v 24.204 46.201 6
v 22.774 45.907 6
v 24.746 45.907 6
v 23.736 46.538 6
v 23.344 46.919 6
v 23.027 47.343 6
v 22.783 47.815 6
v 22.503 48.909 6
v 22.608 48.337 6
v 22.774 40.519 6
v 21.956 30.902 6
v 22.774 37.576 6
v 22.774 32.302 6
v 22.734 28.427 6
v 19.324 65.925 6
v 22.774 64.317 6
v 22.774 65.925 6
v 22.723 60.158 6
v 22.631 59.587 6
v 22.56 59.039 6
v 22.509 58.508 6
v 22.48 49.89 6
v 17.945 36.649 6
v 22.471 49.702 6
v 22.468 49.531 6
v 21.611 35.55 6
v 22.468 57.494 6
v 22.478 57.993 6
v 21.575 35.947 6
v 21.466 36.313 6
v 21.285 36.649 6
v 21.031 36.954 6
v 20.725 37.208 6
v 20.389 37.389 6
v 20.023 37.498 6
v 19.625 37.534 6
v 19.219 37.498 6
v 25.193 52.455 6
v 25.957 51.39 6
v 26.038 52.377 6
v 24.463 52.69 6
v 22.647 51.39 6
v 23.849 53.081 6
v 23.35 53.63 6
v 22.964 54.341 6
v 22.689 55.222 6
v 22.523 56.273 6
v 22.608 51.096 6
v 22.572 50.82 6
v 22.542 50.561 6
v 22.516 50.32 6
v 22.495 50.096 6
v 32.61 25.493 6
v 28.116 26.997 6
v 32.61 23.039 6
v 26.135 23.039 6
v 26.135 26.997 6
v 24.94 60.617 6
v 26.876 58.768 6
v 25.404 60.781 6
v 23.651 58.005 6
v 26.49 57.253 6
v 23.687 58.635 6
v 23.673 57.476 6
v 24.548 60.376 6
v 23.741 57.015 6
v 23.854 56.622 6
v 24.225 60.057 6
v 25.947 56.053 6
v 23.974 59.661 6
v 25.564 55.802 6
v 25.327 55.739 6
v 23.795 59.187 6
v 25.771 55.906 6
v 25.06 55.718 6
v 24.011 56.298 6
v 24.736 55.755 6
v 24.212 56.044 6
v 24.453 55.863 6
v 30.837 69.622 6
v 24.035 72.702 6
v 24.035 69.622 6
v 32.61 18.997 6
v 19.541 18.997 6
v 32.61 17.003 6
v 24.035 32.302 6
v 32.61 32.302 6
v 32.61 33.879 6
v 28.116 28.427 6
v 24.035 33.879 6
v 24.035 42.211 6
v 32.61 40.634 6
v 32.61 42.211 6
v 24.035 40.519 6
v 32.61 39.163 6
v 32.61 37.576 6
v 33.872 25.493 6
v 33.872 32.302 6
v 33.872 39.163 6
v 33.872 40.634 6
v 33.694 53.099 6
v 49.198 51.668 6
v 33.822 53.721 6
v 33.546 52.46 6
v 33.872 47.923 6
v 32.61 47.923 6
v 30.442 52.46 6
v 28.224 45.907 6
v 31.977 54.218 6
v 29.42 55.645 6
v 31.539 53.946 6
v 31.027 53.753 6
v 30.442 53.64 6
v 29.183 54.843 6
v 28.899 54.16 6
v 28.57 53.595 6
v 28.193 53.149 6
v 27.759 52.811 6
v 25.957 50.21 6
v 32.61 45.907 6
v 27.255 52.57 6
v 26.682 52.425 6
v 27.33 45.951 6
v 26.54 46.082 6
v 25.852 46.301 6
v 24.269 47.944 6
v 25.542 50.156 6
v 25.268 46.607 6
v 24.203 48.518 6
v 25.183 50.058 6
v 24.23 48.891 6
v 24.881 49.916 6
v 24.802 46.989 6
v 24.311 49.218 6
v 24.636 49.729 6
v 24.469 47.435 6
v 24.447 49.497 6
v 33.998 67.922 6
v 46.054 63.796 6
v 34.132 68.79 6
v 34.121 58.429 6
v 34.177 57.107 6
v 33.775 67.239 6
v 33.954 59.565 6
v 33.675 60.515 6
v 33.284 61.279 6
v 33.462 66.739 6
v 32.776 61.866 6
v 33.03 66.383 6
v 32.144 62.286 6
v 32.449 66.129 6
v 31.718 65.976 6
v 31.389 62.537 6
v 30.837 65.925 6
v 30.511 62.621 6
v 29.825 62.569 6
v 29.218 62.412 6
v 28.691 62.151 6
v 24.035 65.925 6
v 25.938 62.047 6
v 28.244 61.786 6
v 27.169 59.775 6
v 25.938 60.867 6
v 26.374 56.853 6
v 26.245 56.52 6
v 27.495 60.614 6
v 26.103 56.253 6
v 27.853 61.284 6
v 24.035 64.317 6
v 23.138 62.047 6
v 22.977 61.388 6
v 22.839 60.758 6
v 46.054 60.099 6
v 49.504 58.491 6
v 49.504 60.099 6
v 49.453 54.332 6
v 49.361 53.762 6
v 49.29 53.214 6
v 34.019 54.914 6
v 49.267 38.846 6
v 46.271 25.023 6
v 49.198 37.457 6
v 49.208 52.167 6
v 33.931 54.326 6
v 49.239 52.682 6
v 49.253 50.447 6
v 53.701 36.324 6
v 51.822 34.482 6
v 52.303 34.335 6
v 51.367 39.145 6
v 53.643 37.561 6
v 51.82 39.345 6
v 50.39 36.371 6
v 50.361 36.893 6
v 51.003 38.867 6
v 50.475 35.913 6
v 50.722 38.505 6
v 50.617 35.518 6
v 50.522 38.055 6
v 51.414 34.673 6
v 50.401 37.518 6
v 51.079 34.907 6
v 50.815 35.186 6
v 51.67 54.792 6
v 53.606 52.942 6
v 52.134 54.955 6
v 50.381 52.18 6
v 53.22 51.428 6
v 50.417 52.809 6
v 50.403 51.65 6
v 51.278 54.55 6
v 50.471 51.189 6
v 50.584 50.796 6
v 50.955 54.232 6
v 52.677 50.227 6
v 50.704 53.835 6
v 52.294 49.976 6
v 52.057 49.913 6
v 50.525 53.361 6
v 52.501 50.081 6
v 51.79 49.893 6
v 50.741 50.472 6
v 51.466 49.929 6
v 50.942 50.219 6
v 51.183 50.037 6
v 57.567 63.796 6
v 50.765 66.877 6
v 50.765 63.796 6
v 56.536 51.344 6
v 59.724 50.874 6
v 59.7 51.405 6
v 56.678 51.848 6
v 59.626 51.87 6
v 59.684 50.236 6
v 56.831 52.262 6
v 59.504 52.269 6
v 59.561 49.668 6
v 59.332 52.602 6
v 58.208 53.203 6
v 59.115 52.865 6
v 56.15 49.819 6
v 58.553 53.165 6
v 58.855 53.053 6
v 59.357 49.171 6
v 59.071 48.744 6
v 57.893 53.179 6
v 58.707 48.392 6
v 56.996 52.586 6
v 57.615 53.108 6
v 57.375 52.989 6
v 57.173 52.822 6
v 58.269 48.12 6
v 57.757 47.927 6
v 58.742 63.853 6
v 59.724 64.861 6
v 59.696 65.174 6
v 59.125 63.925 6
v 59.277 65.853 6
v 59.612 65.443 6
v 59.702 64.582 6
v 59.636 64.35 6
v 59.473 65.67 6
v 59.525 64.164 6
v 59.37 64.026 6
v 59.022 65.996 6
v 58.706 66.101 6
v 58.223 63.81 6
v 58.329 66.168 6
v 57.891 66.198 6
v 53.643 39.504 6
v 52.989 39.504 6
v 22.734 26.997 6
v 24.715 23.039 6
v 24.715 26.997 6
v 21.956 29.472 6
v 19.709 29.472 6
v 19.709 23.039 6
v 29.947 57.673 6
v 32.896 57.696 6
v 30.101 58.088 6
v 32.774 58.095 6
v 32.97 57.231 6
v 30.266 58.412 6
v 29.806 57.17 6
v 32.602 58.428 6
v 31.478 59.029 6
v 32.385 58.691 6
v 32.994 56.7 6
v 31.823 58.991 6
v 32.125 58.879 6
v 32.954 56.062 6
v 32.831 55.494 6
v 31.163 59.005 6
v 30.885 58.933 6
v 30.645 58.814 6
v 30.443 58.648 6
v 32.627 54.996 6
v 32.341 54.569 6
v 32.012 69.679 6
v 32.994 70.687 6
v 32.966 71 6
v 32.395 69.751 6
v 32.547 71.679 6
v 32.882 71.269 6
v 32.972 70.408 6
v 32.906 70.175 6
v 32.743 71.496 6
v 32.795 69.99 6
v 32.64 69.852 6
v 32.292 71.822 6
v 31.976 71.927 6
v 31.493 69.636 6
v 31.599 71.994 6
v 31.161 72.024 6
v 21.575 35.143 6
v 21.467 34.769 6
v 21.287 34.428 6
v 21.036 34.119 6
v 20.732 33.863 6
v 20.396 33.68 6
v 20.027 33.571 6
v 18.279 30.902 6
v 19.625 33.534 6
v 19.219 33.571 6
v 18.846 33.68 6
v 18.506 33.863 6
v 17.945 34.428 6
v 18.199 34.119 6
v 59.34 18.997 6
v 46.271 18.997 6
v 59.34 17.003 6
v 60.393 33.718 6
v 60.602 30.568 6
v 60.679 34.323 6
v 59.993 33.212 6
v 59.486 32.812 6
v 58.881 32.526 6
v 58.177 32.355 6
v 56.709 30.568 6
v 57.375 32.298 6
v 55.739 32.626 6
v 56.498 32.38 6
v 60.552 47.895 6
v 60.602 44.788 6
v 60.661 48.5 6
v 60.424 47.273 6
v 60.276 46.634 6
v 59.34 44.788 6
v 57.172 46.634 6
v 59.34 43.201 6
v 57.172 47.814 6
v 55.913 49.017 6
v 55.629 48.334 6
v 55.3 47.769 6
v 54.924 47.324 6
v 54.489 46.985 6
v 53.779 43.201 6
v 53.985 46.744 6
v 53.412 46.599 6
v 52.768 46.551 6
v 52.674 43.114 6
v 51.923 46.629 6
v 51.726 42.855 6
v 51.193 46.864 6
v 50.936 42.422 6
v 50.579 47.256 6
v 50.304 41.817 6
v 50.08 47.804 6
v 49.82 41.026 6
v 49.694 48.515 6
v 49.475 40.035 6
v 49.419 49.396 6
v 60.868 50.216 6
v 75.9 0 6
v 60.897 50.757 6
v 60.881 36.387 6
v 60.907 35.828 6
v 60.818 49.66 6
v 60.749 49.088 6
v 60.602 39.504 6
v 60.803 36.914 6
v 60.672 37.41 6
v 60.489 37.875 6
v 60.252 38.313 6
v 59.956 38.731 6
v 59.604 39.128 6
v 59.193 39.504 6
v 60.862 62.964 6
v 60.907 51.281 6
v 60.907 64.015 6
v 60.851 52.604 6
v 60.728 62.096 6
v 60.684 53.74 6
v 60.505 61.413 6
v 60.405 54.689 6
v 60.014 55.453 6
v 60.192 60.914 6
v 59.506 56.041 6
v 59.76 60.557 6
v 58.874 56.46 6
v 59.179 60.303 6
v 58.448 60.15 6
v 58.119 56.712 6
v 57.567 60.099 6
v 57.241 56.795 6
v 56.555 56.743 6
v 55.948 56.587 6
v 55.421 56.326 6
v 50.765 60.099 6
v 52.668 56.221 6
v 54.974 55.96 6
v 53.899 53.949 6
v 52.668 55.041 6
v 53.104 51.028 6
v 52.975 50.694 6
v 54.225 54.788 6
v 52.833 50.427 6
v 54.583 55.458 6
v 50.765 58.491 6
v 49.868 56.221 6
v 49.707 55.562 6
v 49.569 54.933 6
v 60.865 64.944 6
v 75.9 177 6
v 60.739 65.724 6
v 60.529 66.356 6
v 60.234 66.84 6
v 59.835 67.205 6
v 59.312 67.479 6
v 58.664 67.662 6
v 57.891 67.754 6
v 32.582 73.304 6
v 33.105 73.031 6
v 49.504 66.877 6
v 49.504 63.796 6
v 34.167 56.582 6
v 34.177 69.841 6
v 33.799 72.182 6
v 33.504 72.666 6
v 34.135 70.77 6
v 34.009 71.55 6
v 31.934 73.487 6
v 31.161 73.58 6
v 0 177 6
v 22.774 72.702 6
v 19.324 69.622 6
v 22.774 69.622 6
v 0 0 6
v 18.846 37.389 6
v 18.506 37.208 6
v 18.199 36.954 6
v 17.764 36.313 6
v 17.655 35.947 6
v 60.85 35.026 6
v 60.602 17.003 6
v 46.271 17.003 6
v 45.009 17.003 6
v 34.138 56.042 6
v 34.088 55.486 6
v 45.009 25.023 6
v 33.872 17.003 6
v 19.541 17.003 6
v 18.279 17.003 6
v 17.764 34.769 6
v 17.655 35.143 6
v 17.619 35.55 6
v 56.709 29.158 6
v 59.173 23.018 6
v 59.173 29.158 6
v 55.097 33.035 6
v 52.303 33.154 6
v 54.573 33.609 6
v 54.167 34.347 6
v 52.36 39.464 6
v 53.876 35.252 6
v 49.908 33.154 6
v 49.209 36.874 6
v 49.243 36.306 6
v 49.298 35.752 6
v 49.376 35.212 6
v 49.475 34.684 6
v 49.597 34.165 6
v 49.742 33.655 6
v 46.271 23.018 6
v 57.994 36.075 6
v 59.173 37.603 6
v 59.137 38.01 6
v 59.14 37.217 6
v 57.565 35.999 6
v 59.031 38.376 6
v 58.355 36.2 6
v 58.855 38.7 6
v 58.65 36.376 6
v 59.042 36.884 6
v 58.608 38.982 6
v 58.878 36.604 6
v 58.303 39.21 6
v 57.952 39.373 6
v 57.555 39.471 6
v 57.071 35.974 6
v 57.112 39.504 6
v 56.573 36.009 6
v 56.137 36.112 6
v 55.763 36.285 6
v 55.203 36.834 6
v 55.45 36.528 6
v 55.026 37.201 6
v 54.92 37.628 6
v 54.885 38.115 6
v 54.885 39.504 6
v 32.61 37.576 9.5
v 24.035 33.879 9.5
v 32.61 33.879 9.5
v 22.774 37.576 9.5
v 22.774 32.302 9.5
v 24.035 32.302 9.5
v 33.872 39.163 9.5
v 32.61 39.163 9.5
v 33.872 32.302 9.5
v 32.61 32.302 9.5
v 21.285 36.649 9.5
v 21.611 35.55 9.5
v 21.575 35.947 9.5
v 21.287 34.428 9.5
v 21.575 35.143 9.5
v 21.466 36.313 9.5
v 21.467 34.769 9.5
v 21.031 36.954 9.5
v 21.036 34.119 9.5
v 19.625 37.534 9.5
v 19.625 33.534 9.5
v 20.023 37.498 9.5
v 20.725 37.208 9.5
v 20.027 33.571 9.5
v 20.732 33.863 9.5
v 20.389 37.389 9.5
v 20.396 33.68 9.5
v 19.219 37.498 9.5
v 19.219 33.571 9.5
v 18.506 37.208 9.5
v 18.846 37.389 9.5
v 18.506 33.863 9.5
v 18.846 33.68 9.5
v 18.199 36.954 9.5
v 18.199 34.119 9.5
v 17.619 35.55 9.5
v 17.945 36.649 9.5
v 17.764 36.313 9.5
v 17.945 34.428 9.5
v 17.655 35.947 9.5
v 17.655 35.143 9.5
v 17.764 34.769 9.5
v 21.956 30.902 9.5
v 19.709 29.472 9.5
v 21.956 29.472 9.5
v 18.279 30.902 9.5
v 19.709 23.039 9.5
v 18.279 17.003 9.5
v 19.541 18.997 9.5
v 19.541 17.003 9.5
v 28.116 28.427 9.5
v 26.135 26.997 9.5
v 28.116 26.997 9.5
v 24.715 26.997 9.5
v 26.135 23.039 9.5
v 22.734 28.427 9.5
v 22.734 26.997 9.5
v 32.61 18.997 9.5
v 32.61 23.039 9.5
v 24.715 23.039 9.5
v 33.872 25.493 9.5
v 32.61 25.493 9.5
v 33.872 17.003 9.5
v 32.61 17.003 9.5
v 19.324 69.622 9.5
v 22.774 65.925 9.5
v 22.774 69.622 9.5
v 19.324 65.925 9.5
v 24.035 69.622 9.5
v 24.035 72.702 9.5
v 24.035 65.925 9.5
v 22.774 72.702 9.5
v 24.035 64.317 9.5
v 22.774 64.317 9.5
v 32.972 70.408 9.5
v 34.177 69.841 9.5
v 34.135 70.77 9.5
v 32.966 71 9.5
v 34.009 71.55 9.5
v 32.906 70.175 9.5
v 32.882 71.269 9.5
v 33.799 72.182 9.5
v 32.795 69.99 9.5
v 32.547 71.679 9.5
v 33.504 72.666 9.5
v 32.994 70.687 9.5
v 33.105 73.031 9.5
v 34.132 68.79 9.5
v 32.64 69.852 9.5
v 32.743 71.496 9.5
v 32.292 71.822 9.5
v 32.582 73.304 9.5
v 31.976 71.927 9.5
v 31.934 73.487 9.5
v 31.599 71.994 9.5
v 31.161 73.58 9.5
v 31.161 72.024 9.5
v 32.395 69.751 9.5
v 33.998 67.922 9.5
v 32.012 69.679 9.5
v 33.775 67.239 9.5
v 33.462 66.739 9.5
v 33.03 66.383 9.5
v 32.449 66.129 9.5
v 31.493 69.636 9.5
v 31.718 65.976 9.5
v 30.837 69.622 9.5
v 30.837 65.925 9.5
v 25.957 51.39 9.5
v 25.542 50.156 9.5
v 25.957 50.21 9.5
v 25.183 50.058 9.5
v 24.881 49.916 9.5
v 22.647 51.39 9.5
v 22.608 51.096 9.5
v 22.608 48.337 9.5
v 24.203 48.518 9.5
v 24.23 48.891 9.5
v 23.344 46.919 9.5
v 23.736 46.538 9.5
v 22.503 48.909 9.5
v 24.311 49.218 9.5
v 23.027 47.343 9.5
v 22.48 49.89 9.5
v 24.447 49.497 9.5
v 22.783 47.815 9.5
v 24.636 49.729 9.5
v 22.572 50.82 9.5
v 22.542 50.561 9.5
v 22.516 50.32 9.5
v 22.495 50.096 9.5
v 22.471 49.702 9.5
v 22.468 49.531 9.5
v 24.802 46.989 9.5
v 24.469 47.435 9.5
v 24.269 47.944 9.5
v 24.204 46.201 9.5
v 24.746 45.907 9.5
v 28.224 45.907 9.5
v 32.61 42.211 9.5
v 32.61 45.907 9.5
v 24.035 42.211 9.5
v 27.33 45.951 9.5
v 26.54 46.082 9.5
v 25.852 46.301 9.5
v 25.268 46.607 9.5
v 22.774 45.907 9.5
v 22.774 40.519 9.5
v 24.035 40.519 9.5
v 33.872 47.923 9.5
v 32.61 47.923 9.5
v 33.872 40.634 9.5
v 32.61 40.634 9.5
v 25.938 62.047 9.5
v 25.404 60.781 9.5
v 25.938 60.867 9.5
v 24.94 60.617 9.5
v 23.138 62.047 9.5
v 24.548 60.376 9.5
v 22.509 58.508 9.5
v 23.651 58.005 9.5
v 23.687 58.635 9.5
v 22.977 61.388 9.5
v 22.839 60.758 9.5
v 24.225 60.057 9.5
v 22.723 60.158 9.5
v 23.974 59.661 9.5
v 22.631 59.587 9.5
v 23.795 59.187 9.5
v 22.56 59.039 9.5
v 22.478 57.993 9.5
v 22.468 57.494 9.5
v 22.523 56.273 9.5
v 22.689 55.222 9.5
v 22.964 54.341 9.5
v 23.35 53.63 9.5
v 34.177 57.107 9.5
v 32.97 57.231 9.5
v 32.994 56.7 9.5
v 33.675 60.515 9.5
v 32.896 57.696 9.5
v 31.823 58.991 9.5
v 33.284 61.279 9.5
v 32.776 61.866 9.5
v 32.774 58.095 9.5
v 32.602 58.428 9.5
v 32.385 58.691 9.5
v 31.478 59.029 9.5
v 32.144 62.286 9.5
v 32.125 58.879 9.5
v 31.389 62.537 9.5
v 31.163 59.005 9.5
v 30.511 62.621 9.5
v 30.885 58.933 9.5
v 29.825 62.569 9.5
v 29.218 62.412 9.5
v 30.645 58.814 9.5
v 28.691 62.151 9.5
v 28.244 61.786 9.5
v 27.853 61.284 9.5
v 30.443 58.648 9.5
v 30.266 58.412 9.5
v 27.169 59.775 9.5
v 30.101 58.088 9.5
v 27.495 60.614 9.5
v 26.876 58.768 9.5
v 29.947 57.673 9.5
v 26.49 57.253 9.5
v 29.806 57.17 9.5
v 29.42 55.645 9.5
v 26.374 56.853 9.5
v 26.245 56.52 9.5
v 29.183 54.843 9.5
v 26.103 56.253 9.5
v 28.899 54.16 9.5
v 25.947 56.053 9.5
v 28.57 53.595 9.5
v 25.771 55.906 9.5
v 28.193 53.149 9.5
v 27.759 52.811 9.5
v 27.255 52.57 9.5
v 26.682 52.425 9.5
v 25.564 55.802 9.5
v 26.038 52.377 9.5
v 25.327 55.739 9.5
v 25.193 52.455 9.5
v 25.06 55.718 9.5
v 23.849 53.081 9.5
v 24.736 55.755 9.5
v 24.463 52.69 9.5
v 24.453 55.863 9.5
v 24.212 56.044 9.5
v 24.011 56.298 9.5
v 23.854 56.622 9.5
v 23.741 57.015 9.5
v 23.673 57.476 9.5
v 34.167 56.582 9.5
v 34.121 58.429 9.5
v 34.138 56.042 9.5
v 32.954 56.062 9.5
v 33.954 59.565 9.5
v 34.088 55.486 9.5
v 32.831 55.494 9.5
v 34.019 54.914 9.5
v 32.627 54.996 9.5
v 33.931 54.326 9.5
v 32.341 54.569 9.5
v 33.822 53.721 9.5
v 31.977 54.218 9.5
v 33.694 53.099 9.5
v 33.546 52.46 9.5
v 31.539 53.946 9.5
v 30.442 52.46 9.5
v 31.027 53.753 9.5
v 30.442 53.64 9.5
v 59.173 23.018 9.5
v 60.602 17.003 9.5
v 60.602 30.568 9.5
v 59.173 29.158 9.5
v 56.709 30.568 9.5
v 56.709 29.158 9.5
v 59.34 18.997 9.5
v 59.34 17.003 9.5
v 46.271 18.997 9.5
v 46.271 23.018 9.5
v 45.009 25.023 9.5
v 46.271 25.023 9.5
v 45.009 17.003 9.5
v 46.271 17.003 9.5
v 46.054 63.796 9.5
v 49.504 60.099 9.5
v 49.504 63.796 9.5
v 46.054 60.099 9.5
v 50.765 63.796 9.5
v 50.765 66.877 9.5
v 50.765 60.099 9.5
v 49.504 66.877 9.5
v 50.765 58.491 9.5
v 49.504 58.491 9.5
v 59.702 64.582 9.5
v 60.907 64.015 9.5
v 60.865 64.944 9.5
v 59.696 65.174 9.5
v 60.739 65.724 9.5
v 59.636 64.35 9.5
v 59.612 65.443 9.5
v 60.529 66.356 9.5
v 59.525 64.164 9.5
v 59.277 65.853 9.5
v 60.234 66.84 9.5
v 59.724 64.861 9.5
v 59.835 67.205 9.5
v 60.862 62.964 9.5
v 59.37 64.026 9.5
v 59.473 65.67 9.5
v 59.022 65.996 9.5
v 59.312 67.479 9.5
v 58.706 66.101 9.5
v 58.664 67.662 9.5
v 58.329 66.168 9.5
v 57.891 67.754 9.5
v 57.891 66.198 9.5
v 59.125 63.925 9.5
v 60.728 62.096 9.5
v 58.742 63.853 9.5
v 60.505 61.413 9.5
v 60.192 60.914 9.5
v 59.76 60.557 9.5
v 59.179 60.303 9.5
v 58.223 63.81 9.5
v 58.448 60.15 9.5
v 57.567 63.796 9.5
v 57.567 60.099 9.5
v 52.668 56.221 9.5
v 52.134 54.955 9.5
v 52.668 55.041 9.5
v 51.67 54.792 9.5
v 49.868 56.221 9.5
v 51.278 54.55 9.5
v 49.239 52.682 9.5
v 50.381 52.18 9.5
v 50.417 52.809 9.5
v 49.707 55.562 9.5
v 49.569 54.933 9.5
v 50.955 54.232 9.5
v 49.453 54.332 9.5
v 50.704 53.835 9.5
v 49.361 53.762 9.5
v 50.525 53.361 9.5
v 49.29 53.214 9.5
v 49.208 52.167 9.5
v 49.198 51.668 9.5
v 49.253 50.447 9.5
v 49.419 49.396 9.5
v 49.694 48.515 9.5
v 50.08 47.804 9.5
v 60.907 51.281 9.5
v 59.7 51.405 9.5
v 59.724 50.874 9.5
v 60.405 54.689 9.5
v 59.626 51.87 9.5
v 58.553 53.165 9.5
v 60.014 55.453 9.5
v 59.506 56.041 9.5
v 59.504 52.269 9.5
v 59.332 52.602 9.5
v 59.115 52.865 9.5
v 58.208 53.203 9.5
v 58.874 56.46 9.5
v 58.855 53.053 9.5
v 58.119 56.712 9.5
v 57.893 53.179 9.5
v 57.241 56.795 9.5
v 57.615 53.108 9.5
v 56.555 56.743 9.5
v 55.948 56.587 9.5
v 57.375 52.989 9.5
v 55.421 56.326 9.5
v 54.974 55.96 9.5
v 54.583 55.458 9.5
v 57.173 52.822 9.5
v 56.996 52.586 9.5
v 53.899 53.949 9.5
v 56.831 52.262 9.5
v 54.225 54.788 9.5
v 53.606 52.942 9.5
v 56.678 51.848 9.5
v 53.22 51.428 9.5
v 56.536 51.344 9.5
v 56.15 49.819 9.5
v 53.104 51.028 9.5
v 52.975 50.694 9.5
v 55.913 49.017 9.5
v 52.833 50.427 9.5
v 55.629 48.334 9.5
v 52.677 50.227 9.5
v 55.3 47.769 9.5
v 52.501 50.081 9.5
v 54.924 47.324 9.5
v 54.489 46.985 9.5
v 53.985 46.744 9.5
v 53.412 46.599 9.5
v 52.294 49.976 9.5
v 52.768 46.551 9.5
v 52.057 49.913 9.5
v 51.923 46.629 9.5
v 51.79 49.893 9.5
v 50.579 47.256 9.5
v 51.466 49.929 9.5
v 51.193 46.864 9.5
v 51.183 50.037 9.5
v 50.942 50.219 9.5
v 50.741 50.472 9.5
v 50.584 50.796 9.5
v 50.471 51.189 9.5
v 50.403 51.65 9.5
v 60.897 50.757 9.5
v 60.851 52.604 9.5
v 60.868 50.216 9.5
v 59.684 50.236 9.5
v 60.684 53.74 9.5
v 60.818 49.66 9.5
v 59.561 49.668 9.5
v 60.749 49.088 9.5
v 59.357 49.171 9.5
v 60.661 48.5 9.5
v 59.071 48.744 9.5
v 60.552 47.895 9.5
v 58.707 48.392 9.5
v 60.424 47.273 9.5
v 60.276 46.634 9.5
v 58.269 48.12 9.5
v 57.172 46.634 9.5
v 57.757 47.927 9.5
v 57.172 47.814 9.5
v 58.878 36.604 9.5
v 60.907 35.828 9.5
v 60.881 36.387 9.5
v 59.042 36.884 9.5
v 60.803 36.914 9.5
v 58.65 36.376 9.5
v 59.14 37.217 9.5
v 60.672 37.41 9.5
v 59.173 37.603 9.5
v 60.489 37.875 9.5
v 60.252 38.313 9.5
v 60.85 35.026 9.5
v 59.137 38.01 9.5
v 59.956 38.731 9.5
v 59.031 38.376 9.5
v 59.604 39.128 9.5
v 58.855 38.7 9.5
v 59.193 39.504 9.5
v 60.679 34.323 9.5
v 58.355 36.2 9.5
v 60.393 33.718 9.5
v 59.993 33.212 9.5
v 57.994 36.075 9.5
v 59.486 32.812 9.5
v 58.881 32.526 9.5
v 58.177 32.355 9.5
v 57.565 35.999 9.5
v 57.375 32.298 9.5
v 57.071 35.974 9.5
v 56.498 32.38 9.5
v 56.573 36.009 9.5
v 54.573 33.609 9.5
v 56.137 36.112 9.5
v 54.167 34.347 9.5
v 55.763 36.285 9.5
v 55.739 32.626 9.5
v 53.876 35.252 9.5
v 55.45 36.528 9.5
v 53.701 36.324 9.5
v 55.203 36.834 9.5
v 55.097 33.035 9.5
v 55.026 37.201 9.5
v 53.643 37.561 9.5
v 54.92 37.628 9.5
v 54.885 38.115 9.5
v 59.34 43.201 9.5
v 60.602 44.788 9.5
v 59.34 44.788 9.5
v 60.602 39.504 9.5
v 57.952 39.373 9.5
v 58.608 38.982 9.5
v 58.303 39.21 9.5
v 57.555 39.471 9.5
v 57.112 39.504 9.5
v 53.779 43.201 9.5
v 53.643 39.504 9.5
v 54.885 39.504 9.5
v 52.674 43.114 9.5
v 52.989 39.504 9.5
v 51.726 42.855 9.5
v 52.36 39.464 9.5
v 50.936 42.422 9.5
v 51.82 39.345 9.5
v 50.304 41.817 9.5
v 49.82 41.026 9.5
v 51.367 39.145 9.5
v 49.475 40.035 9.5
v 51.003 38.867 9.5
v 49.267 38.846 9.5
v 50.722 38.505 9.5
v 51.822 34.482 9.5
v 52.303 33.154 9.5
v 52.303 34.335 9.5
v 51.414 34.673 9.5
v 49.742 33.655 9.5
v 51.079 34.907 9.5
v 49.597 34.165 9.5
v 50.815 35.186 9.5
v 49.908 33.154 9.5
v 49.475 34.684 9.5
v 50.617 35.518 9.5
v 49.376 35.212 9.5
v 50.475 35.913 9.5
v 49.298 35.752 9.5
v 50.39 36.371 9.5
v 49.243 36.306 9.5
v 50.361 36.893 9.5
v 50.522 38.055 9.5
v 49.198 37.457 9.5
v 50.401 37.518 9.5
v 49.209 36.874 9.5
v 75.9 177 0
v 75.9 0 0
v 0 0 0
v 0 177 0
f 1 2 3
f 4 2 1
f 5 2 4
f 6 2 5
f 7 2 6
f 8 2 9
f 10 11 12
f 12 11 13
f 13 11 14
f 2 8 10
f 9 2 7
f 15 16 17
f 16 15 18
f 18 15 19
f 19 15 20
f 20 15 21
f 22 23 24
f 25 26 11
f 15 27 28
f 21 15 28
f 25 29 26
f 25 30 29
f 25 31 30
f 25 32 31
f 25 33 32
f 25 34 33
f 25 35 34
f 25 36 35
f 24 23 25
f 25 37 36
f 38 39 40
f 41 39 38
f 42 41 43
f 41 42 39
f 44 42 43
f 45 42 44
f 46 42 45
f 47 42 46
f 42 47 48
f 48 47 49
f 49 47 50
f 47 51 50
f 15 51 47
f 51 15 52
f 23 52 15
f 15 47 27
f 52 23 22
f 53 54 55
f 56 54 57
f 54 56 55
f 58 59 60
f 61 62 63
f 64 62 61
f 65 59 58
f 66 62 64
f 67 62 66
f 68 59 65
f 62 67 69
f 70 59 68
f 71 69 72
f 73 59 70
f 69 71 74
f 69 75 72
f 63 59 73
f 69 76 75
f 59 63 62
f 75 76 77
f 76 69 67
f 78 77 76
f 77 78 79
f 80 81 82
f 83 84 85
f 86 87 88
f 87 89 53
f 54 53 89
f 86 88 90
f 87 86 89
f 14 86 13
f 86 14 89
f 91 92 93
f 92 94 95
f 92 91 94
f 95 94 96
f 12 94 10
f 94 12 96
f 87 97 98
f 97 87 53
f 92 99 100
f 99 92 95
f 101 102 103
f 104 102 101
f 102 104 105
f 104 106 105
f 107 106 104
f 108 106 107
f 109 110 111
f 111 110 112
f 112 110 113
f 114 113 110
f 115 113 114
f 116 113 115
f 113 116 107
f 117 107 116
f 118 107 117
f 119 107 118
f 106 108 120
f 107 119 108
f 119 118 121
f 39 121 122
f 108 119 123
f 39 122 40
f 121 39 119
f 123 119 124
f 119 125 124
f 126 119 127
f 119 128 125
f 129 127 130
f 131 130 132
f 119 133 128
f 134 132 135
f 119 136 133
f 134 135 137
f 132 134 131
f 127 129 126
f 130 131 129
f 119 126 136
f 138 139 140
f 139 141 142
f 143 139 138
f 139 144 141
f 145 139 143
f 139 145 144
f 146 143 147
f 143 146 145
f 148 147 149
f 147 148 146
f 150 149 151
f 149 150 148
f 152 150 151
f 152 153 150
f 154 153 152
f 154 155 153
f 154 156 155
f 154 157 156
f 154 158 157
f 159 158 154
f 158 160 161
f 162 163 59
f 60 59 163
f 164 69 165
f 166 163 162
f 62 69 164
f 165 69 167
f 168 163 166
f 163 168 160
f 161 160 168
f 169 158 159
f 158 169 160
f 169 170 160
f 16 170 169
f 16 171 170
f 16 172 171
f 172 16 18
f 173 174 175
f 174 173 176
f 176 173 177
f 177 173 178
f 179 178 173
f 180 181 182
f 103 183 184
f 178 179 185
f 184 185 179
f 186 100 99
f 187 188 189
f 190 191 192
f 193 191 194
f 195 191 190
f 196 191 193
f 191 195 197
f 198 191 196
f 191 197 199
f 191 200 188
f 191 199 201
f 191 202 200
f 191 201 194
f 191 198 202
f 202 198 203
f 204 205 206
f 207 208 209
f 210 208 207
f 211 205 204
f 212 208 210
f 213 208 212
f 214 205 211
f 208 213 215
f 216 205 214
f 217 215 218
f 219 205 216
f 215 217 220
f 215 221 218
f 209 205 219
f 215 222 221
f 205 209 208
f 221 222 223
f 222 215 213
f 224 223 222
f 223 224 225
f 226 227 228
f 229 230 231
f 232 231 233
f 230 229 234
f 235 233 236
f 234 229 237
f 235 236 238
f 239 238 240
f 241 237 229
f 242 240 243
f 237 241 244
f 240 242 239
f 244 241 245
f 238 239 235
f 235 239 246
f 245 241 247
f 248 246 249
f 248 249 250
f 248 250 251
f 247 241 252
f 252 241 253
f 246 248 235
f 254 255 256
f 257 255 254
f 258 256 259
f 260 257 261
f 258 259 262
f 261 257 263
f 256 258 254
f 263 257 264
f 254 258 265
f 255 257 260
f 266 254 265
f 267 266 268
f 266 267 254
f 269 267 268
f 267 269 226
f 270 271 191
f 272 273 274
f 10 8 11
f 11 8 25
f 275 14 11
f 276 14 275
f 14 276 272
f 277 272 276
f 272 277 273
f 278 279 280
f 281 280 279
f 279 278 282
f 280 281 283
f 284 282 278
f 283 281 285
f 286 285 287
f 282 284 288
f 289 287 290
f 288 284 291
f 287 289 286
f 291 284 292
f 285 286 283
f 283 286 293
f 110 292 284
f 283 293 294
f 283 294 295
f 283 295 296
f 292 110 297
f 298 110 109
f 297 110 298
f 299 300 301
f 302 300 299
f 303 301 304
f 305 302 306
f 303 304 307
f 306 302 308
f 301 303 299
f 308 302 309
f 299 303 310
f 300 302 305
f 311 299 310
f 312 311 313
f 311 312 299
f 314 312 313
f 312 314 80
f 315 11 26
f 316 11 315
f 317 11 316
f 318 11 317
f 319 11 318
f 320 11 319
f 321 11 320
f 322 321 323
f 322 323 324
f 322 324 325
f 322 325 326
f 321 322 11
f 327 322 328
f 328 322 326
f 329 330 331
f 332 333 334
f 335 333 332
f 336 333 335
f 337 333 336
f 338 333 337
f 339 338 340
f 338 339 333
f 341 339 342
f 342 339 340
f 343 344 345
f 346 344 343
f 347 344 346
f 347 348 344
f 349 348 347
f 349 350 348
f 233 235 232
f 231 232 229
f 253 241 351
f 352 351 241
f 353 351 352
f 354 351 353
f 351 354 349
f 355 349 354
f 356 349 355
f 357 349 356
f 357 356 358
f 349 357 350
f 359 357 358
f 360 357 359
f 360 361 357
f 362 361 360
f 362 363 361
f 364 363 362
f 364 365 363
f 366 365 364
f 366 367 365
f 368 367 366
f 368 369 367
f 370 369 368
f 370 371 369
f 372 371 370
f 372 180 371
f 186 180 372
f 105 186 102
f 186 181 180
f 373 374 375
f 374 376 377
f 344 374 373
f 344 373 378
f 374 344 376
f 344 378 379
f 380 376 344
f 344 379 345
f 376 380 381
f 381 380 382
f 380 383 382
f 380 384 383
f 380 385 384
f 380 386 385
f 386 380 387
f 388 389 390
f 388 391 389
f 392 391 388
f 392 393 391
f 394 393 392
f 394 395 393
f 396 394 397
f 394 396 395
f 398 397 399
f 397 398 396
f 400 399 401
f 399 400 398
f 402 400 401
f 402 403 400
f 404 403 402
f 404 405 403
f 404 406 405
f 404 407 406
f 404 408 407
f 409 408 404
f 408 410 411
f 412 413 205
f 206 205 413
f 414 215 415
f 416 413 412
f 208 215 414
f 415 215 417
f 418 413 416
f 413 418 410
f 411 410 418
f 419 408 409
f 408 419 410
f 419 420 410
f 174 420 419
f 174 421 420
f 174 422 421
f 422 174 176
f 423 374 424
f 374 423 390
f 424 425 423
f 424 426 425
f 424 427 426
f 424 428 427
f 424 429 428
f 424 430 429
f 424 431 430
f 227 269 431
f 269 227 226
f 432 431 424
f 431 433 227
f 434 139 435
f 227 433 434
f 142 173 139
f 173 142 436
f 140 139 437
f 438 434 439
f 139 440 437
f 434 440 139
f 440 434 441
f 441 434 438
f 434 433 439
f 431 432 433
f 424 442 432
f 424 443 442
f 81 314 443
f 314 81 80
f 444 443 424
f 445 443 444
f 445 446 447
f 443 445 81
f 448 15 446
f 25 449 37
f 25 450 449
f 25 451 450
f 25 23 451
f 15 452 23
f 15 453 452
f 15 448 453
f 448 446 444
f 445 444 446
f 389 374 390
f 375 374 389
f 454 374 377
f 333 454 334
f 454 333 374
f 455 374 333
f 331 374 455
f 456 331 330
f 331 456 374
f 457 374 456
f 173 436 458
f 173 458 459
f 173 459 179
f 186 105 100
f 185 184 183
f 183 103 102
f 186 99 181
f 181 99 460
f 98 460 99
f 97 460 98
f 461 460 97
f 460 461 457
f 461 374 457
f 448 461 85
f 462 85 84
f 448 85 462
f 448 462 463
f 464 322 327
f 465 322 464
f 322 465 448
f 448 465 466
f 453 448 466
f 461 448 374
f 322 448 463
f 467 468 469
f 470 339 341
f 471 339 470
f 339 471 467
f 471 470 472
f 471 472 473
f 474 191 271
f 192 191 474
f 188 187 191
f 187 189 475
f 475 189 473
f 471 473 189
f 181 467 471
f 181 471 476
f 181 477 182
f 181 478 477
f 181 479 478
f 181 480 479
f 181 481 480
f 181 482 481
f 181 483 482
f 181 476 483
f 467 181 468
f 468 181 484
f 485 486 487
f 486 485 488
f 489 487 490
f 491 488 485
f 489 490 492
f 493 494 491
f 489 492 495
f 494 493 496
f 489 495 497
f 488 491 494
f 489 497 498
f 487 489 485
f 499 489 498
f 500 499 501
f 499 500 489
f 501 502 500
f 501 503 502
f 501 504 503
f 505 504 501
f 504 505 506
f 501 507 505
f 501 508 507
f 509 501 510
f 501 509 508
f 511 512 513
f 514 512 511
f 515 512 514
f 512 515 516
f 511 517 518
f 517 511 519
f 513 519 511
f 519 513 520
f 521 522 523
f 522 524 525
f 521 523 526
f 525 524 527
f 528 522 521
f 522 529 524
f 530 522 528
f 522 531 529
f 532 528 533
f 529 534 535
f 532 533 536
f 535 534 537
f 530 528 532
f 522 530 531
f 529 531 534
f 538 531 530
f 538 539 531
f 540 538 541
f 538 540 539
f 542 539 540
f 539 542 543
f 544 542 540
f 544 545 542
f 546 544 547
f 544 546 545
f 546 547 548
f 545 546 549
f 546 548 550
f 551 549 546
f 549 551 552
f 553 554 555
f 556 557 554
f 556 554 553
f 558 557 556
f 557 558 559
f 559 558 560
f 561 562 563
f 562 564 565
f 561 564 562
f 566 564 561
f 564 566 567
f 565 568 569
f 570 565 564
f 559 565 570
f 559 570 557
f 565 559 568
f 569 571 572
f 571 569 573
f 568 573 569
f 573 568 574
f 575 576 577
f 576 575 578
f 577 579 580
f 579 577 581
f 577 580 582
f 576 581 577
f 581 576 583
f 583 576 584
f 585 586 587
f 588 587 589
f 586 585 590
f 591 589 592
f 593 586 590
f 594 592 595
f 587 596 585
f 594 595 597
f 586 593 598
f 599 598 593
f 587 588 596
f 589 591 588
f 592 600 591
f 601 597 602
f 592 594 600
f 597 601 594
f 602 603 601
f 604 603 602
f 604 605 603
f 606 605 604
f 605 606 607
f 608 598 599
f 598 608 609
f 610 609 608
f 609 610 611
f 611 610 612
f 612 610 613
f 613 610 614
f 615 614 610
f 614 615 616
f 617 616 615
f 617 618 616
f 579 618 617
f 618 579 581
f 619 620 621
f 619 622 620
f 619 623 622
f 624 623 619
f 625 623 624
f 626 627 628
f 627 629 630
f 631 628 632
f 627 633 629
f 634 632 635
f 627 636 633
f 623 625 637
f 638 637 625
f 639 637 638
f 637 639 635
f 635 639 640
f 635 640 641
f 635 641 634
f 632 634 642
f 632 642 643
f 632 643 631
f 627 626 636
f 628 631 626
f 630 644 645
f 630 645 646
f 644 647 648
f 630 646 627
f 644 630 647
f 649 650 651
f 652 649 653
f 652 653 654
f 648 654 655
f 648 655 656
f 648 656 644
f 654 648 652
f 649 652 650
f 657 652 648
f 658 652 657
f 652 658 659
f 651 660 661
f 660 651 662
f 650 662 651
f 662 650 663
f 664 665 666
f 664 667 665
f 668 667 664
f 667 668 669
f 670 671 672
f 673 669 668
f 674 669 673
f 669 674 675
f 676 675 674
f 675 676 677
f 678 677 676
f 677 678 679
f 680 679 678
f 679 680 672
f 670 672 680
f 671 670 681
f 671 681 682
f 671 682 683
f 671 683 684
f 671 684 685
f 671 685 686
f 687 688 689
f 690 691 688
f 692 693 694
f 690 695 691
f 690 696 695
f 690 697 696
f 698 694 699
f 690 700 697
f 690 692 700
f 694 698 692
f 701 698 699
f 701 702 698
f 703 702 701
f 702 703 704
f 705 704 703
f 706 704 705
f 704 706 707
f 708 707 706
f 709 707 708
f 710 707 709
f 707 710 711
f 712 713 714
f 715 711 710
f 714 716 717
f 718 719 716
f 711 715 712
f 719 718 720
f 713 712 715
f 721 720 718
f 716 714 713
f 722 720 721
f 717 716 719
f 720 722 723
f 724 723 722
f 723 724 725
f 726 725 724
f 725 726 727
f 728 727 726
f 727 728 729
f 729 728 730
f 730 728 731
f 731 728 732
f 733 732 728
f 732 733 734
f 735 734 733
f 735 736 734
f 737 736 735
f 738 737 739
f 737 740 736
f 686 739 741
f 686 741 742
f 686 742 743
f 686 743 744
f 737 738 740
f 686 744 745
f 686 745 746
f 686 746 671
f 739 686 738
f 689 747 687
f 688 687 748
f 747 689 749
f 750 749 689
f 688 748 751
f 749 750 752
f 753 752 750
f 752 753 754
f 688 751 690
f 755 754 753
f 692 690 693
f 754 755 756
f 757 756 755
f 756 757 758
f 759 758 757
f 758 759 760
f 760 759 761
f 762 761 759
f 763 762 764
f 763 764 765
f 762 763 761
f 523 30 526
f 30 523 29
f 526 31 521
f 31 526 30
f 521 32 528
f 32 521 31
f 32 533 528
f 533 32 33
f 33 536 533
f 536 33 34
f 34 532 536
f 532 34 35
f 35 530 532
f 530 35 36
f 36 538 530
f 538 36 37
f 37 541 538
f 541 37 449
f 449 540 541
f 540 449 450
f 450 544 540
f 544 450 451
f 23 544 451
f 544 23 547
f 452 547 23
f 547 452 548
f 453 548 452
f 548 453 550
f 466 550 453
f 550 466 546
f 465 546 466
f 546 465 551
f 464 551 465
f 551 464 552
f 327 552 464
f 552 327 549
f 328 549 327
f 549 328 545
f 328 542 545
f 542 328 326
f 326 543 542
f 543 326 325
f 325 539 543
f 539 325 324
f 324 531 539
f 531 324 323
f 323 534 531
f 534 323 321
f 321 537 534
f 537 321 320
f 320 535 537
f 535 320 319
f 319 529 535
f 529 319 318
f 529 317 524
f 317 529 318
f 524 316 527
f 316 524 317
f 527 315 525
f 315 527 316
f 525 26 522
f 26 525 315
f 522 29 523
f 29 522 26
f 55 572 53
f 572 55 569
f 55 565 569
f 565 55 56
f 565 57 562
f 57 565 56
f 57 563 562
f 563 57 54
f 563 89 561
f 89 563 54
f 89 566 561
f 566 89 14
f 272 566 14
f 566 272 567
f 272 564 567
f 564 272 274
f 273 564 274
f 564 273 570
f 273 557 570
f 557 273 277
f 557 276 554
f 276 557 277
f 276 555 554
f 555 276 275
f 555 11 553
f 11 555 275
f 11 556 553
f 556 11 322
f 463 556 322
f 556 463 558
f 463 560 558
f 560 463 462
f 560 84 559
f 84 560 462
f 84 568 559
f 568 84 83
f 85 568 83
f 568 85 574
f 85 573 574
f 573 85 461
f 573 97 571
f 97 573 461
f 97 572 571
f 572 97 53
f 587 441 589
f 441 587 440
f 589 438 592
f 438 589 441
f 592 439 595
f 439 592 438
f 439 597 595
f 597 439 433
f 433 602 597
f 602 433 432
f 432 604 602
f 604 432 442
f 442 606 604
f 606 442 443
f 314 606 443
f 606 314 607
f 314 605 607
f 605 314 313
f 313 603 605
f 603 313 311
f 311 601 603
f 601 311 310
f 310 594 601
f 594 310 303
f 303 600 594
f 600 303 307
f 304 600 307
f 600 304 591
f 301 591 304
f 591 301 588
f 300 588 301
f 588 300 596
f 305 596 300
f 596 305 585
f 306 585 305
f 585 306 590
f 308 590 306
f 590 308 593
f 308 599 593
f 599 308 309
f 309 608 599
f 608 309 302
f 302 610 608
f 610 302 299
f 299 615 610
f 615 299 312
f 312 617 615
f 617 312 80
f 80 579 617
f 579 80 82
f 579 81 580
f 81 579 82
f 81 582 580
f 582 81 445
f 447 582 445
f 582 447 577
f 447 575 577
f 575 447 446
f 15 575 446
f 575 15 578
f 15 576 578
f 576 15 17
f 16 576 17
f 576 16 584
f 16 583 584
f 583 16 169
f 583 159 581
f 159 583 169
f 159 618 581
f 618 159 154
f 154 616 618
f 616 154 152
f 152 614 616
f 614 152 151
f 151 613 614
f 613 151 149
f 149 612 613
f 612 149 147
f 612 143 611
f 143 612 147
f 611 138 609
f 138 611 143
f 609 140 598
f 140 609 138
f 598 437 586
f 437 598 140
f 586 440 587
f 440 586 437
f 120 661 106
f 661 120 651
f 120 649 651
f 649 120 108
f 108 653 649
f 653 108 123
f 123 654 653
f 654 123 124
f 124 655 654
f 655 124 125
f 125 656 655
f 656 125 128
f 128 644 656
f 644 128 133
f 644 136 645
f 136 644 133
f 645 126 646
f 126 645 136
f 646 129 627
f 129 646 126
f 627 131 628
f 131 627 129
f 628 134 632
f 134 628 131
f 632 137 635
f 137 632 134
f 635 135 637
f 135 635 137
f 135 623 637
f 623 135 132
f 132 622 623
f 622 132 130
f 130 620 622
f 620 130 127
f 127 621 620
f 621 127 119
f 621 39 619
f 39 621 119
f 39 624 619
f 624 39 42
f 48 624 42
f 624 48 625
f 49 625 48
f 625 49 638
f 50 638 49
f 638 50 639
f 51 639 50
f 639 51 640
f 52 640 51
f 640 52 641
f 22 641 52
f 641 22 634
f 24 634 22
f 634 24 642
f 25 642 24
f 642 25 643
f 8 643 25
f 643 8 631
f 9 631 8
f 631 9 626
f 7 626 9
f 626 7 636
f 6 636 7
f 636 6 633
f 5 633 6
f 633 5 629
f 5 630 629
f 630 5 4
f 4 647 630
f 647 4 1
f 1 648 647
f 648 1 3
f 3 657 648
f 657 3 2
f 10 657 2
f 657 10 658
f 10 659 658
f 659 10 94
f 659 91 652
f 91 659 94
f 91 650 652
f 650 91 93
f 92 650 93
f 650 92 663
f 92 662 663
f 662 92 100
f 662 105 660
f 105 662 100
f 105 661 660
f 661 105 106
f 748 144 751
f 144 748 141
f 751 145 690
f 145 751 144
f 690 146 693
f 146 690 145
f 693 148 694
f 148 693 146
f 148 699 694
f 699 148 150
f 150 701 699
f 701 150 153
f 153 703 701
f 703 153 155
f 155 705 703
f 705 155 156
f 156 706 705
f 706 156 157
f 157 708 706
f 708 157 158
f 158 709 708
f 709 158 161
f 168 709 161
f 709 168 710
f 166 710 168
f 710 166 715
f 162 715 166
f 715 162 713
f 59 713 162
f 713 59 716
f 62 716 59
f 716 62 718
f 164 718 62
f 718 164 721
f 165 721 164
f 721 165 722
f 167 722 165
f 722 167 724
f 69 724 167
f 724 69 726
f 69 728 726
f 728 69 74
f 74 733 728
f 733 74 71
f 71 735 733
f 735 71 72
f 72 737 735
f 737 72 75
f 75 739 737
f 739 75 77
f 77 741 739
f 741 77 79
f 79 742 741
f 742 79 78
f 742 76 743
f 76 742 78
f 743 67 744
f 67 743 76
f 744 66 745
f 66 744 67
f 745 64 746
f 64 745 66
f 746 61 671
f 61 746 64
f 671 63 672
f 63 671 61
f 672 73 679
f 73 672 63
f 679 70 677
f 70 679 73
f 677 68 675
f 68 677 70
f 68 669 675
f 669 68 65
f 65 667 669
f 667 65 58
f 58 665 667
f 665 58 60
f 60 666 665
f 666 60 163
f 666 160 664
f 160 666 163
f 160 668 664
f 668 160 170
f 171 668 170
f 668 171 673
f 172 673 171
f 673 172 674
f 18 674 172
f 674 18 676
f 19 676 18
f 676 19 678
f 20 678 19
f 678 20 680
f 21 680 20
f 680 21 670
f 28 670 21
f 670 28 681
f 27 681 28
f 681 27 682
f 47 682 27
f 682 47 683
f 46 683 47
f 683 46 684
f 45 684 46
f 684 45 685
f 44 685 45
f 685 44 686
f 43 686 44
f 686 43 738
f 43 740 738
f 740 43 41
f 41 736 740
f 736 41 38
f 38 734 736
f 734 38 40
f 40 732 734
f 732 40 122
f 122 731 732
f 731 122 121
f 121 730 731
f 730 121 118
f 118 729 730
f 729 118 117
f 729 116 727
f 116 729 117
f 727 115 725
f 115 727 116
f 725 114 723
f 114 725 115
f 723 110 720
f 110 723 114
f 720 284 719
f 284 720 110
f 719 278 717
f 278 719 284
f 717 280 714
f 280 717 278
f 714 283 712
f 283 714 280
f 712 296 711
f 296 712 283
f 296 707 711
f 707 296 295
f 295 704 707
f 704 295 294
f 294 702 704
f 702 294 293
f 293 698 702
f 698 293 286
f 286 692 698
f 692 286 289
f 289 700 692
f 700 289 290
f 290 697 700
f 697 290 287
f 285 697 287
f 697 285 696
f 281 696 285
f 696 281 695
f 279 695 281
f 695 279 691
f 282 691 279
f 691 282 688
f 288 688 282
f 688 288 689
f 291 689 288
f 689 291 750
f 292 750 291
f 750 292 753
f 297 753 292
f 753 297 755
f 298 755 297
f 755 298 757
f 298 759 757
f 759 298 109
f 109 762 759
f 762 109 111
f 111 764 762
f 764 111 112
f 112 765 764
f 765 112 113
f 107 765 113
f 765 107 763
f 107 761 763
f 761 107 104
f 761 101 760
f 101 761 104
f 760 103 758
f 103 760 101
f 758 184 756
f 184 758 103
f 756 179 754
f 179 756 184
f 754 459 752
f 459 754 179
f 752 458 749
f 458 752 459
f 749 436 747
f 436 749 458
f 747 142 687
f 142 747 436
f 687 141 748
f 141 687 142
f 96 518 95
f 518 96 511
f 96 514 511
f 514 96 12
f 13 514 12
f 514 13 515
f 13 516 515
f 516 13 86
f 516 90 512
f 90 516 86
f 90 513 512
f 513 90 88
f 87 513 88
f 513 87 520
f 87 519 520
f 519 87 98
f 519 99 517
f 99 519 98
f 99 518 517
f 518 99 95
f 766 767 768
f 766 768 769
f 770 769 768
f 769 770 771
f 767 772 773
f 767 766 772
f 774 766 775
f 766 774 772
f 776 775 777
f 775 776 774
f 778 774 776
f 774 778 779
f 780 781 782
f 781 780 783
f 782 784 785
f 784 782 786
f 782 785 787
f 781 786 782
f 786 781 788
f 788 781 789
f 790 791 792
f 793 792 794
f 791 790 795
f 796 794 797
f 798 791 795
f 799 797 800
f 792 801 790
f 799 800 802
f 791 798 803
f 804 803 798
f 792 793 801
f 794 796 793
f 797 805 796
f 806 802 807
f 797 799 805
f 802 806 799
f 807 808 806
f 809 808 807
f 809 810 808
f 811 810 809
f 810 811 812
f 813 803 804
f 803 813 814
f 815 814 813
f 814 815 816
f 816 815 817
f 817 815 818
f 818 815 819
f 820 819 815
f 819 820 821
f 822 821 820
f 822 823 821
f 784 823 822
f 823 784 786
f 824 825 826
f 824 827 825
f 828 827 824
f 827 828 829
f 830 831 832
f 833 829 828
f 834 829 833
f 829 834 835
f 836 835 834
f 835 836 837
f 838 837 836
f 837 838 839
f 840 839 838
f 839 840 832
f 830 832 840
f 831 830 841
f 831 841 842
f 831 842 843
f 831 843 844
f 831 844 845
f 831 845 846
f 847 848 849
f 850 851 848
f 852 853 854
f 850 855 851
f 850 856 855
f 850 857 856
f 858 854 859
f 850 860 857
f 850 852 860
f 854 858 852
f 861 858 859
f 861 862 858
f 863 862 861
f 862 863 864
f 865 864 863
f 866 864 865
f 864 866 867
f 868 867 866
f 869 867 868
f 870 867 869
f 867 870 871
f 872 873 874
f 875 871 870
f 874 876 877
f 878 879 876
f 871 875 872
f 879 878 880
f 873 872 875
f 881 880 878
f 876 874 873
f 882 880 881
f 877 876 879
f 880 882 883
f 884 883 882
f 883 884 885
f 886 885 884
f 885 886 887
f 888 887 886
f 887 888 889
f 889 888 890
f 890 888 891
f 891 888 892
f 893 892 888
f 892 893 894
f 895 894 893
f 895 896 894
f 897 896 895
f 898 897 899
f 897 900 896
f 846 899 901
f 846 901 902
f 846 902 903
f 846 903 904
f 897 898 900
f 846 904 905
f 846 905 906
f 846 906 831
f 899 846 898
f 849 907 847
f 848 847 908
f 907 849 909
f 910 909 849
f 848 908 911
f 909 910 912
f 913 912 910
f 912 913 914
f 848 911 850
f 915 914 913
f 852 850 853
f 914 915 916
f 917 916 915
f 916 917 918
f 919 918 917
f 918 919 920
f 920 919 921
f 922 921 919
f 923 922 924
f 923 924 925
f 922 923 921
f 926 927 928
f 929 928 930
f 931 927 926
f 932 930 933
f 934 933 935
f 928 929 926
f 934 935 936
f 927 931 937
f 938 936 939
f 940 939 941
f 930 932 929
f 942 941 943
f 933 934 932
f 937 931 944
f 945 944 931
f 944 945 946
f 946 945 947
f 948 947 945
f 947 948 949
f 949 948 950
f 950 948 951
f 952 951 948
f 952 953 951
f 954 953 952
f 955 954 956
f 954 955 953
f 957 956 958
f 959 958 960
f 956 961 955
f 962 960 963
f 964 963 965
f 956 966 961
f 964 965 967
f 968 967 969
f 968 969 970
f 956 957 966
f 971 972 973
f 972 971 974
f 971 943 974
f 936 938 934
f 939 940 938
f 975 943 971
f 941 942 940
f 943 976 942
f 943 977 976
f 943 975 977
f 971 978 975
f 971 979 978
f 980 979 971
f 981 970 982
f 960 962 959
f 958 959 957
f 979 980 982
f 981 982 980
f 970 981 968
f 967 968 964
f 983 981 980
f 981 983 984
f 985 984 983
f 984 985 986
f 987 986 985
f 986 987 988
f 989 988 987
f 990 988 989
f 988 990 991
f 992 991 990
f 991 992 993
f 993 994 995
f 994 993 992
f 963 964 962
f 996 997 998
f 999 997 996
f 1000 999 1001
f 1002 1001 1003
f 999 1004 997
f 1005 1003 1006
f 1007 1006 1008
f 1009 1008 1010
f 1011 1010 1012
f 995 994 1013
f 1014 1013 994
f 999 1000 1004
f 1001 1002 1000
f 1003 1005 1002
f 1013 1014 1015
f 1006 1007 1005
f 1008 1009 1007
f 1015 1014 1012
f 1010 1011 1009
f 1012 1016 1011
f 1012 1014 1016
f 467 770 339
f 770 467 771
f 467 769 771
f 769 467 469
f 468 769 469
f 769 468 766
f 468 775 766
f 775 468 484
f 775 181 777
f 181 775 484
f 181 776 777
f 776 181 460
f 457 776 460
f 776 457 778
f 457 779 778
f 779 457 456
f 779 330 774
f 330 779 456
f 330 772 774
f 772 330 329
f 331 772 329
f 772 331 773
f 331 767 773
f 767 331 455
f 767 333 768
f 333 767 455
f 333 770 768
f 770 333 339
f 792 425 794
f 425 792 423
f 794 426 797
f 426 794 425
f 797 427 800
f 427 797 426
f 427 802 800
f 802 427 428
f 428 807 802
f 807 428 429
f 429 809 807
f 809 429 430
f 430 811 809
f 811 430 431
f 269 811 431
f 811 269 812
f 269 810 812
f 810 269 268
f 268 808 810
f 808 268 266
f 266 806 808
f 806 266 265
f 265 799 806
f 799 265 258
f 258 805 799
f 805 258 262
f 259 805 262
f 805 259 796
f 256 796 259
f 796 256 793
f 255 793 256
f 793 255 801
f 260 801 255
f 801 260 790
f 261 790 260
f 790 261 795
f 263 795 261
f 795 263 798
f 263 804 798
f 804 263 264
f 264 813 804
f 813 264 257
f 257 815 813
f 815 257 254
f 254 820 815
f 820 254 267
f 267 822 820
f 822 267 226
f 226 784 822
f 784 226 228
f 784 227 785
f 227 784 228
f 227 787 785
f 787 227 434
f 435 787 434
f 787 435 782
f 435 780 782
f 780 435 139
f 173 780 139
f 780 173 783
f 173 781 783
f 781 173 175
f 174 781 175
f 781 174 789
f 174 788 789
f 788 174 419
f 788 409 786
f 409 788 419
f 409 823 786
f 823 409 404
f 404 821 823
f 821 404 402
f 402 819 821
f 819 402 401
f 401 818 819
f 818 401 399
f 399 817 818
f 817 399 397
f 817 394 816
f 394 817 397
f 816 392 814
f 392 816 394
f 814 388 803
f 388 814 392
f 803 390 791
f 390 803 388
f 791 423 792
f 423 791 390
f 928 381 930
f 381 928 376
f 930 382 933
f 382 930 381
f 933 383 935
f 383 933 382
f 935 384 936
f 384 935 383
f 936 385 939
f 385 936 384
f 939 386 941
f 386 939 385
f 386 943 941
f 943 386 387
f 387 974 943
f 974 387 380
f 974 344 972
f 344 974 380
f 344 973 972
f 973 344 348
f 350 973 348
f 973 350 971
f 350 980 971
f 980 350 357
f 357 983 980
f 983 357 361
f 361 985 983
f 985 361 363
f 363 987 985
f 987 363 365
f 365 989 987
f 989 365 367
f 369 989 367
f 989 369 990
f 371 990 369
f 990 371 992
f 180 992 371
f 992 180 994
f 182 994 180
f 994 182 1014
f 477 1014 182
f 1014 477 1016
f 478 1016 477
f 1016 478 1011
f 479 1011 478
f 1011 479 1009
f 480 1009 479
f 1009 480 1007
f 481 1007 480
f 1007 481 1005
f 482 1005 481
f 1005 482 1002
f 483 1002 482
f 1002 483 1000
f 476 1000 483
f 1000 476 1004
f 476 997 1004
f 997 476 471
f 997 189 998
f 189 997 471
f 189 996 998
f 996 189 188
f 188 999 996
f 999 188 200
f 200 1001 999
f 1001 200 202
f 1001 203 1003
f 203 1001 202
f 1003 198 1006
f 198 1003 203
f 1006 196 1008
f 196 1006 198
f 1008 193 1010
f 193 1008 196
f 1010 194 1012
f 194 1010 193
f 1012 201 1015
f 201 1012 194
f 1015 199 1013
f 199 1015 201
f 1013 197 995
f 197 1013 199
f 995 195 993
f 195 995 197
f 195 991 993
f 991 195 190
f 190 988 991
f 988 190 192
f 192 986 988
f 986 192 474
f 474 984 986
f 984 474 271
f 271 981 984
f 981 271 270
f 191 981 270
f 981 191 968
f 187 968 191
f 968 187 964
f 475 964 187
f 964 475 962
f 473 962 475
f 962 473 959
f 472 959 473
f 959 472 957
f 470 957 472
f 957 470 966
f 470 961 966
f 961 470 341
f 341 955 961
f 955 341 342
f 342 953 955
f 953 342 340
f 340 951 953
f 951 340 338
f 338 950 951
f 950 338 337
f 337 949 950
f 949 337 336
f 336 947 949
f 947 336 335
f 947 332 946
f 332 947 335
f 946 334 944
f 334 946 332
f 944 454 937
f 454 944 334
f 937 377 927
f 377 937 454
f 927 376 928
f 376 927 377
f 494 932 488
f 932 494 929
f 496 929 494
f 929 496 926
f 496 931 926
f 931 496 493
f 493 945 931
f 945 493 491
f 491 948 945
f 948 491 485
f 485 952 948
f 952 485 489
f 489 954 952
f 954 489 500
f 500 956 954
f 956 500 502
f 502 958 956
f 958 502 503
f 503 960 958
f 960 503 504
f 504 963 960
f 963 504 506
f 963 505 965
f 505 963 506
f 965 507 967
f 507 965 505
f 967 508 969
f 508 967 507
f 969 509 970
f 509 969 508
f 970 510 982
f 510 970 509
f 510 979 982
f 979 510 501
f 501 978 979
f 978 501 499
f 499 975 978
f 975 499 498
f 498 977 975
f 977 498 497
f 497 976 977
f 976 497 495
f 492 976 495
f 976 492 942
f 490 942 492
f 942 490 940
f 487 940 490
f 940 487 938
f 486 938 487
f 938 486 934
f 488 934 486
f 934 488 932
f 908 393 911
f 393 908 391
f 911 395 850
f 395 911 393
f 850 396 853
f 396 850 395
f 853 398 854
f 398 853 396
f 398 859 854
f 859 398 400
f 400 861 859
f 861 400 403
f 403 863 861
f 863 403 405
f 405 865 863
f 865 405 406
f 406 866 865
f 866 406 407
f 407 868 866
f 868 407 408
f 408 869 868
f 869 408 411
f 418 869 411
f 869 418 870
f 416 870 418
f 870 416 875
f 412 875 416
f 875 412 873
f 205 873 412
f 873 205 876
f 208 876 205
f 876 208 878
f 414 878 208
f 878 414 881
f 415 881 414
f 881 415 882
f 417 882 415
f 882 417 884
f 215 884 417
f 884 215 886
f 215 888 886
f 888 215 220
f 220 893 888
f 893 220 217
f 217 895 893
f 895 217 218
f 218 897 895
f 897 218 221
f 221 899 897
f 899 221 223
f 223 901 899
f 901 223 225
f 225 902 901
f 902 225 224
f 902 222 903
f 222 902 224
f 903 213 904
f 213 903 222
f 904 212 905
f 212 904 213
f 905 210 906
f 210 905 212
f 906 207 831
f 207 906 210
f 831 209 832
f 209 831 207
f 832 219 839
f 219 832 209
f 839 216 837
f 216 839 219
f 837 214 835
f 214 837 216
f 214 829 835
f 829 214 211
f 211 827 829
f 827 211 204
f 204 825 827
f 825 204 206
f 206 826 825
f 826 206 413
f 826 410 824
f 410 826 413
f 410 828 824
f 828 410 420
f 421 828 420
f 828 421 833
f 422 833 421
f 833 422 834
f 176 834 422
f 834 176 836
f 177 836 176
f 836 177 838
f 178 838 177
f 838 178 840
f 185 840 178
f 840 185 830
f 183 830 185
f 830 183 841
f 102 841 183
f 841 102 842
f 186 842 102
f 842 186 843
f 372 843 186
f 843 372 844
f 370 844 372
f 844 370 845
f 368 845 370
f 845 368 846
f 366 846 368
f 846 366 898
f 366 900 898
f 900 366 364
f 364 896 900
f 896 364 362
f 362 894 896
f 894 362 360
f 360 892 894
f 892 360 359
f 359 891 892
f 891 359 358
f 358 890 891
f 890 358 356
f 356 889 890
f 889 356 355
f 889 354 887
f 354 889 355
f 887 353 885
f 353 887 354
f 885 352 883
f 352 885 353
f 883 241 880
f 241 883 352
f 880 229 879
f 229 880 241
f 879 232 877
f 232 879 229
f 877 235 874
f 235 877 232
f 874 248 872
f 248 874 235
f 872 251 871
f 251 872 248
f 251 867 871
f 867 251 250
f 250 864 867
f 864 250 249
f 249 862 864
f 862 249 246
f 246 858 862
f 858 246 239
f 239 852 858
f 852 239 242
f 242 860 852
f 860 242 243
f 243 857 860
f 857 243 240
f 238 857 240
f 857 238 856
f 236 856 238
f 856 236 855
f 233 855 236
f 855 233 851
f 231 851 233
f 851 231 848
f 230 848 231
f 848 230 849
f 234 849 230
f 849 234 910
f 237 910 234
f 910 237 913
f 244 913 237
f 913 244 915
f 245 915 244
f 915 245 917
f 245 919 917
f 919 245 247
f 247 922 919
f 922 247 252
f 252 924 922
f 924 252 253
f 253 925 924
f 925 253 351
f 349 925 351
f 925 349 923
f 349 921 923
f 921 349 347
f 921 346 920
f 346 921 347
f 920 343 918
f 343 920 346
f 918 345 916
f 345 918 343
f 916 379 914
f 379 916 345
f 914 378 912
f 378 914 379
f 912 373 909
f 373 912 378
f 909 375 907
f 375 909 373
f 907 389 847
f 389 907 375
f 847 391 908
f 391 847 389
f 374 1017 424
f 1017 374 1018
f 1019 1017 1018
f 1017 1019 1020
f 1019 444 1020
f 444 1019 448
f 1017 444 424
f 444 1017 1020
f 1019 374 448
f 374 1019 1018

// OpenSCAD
 

//What is visible
showPlate = true;
showLetters = true;



//Lettering Dimensions

firstname = "First";
lastname = "Last";
lettersize = 15.4;
letterthickness = 3.5;
letterspacing = 1.05;
distancefrombottom = 0;
font = "Georgia:style= Bold";
firstnamedistancefromtop = 18;
lastnamedistancefrombottom = 15;
nameyoffset = 16;



//Plate Dimensions

platewidth = 75.9;
platelength = 177;
platethickness = 6;










  if (showPlate == true)
      {
cube([platewidth,platelength,platethickness]);
  }





firstlastspacing = distancefrombottom;

firstlast = [
[firstname, 0, firstnamedistancefromtop, "top", 0],
[lastname, distancefrombottom, platewidth, "bottom", lastnamedistancefrombottom]]
;

 if (showLetters == true) {

for (a = firstlast) {
translate([a[1] + a[2] - a[4], nameyoffset, platethickness])
{
    rotate([0, 0, 90])
    {

linear_extrude(height=letterthickness)
text(text = a[0],size = lettersize, spacing = letterspacing, font = font, valign = a[3]);
    }        
  }
 }
}
